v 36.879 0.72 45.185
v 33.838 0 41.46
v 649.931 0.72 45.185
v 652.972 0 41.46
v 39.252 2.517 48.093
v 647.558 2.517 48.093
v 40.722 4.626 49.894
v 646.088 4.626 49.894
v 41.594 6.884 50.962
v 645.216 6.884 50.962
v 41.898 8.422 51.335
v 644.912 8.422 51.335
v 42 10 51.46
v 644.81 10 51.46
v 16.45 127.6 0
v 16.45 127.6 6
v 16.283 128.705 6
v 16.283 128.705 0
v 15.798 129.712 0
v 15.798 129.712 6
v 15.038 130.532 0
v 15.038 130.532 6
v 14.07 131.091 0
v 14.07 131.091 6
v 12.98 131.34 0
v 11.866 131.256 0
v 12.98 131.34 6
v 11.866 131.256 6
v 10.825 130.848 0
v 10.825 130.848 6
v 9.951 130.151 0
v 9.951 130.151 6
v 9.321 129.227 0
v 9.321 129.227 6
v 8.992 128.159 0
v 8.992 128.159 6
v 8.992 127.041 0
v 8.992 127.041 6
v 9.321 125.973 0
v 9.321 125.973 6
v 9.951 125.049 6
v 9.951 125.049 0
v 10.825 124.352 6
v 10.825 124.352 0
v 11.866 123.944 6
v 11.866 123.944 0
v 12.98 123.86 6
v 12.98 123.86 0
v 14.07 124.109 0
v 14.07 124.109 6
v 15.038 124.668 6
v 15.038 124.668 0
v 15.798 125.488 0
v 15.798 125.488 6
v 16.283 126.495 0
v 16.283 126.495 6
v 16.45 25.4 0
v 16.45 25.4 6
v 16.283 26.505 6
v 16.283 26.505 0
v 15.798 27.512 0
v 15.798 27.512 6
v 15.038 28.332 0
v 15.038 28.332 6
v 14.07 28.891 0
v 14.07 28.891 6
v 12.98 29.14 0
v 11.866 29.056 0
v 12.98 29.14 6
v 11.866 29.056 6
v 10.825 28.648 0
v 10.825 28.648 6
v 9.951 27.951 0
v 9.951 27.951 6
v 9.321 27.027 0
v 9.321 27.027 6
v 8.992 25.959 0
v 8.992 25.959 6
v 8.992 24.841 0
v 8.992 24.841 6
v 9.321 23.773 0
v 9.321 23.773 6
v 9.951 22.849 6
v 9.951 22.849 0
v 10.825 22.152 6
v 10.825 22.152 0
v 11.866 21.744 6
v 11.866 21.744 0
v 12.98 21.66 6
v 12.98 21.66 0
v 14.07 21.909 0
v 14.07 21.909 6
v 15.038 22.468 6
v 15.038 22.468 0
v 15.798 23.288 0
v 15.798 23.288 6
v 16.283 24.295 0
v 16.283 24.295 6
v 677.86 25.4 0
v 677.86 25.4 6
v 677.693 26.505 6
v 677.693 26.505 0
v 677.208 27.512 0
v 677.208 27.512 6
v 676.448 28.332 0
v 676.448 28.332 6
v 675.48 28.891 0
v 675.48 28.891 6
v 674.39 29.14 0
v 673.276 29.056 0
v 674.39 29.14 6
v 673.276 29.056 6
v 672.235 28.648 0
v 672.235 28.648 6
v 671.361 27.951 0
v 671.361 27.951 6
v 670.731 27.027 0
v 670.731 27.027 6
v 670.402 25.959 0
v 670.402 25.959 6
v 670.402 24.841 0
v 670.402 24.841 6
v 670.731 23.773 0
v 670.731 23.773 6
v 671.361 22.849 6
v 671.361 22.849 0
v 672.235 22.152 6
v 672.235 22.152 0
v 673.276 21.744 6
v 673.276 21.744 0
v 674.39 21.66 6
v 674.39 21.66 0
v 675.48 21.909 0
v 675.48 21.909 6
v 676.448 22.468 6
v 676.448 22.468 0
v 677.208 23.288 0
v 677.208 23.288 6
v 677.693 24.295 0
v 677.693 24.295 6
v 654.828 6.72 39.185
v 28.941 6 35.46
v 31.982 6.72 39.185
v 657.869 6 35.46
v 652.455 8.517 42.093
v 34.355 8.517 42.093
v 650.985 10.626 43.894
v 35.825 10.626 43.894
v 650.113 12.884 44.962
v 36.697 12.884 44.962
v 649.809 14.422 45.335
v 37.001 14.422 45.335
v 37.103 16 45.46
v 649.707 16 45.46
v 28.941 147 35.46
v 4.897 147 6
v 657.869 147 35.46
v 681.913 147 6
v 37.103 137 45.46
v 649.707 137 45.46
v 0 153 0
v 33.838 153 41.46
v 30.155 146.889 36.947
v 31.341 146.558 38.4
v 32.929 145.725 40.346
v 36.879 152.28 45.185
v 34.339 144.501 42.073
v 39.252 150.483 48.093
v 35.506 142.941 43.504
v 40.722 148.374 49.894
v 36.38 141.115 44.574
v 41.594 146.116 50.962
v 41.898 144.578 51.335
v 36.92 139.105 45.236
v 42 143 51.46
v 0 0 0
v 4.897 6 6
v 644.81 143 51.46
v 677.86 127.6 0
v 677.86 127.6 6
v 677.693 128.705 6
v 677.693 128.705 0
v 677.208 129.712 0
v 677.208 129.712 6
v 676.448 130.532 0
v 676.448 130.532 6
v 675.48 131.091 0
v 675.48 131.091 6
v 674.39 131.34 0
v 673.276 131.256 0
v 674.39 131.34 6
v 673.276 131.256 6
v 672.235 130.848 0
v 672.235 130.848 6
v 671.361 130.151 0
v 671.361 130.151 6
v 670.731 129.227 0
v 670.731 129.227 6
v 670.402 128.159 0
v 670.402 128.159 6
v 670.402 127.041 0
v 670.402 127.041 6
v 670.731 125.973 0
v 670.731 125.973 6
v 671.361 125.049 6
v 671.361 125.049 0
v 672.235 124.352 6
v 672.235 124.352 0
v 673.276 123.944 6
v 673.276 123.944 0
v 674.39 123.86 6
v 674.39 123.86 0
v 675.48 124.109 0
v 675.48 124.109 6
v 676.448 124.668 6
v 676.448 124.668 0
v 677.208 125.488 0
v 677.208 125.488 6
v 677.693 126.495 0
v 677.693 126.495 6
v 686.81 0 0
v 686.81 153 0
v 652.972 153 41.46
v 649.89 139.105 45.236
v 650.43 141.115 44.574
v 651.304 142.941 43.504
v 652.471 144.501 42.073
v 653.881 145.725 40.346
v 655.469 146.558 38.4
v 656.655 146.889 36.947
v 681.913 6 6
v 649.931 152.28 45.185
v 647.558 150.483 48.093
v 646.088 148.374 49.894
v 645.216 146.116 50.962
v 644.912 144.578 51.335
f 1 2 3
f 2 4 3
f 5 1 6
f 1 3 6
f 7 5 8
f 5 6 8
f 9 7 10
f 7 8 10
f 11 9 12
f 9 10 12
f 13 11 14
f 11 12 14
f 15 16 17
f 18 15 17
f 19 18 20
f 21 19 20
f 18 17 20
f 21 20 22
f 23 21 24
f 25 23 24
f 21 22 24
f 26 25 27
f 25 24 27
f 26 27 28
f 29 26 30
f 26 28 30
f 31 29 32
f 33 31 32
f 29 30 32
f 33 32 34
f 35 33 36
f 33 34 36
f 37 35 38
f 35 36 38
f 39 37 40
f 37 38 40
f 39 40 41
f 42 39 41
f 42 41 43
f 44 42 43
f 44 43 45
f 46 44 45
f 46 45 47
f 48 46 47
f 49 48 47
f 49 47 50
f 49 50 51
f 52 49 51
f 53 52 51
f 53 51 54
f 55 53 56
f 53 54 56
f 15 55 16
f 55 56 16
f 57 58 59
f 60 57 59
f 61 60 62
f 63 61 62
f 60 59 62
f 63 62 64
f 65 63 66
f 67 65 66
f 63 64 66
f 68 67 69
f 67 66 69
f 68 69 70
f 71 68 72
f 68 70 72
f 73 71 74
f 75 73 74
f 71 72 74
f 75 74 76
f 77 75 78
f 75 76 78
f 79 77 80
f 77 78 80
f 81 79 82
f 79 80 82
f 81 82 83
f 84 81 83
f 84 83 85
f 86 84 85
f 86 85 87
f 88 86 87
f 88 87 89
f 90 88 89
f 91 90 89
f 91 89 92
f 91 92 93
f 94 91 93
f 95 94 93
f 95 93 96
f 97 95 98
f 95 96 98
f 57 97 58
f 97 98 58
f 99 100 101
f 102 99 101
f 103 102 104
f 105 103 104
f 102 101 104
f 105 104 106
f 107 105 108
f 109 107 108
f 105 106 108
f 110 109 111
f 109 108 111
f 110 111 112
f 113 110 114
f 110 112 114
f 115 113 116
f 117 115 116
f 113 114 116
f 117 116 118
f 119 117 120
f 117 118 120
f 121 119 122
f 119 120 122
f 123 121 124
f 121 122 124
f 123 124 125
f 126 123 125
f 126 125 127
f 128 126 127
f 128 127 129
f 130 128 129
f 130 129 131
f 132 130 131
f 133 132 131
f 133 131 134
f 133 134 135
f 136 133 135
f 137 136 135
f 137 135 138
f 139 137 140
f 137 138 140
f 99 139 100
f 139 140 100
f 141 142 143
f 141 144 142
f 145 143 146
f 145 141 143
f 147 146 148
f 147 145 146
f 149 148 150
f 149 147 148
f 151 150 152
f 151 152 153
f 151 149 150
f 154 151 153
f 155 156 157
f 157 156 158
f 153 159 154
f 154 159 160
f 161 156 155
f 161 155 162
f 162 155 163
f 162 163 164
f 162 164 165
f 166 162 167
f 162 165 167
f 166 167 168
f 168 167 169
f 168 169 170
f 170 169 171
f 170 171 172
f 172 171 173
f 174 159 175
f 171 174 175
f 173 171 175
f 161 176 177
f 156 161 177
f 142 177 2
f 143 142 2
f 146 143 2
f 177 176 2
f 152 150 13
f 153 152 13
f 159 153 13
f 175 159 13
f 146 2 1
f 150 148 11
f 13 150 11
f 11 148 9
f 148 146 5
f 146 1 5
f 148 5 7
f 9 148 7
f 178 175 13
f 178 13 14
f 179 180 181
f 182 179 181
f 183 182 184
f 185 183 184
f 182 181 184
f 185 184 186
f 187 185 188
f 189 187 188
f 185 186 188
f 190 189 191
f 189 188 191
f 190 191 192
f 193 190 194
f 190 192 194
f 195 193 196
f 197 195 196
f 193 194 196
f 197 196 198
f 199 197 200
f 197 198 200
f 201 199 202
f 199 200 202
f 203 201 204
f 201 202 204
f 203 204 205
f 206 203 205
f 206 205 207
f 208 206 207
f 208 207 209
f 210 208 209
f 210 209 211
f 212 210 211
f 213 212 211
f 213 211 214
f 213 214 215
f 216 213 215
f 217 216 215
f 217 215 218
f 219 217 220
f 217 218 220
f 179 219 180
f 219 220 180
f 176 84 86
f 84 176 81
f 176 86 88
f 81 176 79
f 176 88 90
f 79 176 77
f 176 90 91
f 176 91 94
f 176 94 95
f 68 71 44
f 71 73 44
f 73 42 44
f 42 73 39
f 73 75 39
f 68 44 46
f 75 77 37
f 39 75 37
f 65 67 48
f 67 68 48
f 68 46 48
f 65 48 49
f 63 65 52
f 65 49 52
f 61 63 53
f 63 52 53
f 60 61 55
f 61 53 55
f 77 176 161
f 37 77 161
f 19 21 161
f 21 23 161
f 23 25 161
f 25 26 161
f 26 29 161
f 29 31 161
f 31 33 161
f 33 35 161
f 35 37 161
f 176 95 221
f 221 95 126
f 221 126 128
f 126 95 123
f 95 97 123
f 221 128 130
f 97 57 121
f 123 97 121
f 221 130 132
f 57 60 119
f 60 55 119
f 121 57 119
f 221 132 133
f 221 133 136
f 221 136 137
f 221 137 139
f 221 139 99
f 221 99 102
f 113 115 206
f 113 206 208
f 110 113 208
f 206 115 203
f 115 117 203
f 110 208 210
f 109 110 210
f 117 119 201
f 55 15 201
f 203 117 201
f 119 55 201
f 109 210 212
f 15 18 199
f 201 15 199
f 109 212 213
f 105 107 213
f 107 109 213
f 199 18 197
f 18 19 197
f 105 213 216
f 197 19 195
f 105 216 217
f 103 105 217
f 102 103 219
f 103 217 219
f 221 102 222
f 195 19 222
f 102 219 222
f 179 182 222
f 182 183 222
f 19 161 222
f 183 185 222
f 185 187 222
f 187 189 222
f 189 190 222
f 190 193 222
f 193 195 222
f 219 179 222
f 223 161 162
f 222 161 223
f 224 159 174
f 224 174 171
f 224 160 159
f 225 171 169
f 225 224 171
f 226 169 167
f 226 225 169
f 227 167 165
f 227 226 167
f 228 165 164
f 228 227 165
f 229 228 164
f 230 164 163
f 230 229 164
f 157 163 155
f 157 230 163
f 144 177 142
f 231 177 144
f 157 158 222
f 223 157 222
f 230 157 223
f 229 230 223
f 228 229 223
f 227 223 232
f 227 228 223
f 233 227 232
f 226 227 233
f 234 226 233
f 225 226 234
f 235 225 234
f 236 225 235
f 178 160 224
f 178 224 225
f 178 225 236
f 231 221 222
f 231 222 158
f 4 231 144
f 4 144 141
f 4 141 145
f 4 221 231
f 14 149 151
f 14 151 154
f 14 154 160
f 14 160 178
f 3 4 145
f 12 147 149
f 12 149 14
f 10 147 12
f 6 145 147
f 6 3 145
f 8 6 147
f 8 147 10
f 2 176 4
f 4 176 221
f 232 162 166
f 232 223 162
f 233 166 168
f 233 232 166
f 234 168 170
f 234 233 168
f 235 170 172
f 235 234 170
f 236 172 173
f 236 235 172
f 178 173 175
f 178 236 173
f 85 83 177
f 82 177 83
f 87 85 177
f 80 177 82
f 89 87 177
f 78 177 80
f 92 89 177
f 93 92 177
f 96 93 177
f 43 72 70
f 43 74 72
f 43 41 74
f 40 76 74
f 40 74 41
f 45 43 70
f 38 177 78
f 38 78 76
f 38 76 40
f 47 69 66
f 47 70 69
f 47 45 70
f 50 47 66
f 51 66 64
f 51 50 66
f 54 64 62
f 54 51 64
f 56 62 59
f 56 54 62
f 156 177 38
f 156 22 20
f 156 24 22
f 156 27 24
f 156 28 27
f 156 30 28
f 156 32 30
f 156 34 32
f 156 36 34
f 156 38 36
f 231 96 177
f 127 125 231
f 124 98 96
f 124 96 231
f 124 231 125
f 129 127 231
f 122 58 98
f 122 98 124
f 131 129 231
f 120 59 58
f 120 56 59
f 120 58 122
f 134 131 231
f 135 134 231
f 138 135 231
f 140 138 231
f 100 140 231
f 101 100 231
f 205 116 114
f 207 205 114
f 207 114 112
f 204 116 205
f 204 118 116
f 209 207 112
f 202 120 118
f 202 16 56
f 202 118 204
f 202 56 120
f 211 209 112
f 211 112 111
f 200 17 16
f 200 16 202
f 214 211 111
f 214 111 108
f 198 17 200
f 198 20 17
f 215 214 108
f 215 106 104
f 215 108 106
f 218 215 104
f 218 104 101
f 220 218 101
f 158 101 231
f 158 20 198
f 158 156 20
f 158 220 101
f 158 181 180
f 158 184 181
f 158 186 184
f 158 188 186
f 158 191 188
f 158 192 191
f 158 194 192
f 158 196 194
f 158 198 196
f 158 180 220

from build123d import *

# Parameters (mm, degrees)
SKETCH1_W           = 686.81
SKETCH1_H           = 153
BOSS_EXTRUDE1_DEPTH = 51.46
CUT_EXTRUDE1_DEPTH  = 153
SHELL1_T            = -6
SKETCH3_R           = 3.75
CUT_EXTRUDE2_DEPTH  = 6
FILLET1_R           = 10


with BuildPart() as part:
    # Sketch1 → Boss-Extrude1 (new body)
    with BuildSketch(Plane.XY):
        with Locations((343.405, 76.5)):
            Rectangle(SKETCH1_W, SKETCH1_H)
    extrude(amount=BOSS_EXTRUDE1_DEPTH)

    # Sketch2 → Cut-Extrude1 (cut)
    with BuildSketch(Plane.XZ):
        Polygon((0, 0), (42, 51.46), (-52.578690856, 191.351676445), (-175.691026148, 25.73), align=None)
        Polygon((686.81, 0), (644.81, 51.46), (843.619472118, 127.98285715), align=None)
    extrude(amount=-CUT_EXTRUDE1_DEPTH, mode=Mode.SUBTRACT)

    # Shell1
    shell1_openings = [part.faces().sort_by_distance(p)[0] for p in [
        (21, 76.5, 25.73),
        (665.81, 76.5, 25.73),
    ]]
    offset(amount=SHELL1_T, openings=shell1_openings, kind=Kind.INTERSECTION)

    # Sketch3 → Cut-Extrude2 (cut)
    with BuildSketch(Plane.XY.offset(6)):
        with Locations((12.7, 25.4)):
            Circle(SKETCH3_R)
        with Locations((12.7, 127.6)):
            Circle(SKETCH3_R)
        with Locations((674.11, 25.4)):
            Circle(SKETCH3_R)
        with Locations((674.11, 127.6)):
            Circle(SKETCH3_R)
    extrude(amount=-CUT_EXTRUDE2_DEPTH, mode=Mode.SUBTRACT)

    # Fillet1
    fillet1_edges = [part.edges().sort_by_distance(p)[0] for p in [
        (343.405, 0, 51.46),
        (343.405, 153, 51.46),
        (343.405, 6, 45.46),
        (343.405, 147, 45.46),
    ]]
    fillet(fillet1_edges, radius=FILLET1_R)


solid = part.part
